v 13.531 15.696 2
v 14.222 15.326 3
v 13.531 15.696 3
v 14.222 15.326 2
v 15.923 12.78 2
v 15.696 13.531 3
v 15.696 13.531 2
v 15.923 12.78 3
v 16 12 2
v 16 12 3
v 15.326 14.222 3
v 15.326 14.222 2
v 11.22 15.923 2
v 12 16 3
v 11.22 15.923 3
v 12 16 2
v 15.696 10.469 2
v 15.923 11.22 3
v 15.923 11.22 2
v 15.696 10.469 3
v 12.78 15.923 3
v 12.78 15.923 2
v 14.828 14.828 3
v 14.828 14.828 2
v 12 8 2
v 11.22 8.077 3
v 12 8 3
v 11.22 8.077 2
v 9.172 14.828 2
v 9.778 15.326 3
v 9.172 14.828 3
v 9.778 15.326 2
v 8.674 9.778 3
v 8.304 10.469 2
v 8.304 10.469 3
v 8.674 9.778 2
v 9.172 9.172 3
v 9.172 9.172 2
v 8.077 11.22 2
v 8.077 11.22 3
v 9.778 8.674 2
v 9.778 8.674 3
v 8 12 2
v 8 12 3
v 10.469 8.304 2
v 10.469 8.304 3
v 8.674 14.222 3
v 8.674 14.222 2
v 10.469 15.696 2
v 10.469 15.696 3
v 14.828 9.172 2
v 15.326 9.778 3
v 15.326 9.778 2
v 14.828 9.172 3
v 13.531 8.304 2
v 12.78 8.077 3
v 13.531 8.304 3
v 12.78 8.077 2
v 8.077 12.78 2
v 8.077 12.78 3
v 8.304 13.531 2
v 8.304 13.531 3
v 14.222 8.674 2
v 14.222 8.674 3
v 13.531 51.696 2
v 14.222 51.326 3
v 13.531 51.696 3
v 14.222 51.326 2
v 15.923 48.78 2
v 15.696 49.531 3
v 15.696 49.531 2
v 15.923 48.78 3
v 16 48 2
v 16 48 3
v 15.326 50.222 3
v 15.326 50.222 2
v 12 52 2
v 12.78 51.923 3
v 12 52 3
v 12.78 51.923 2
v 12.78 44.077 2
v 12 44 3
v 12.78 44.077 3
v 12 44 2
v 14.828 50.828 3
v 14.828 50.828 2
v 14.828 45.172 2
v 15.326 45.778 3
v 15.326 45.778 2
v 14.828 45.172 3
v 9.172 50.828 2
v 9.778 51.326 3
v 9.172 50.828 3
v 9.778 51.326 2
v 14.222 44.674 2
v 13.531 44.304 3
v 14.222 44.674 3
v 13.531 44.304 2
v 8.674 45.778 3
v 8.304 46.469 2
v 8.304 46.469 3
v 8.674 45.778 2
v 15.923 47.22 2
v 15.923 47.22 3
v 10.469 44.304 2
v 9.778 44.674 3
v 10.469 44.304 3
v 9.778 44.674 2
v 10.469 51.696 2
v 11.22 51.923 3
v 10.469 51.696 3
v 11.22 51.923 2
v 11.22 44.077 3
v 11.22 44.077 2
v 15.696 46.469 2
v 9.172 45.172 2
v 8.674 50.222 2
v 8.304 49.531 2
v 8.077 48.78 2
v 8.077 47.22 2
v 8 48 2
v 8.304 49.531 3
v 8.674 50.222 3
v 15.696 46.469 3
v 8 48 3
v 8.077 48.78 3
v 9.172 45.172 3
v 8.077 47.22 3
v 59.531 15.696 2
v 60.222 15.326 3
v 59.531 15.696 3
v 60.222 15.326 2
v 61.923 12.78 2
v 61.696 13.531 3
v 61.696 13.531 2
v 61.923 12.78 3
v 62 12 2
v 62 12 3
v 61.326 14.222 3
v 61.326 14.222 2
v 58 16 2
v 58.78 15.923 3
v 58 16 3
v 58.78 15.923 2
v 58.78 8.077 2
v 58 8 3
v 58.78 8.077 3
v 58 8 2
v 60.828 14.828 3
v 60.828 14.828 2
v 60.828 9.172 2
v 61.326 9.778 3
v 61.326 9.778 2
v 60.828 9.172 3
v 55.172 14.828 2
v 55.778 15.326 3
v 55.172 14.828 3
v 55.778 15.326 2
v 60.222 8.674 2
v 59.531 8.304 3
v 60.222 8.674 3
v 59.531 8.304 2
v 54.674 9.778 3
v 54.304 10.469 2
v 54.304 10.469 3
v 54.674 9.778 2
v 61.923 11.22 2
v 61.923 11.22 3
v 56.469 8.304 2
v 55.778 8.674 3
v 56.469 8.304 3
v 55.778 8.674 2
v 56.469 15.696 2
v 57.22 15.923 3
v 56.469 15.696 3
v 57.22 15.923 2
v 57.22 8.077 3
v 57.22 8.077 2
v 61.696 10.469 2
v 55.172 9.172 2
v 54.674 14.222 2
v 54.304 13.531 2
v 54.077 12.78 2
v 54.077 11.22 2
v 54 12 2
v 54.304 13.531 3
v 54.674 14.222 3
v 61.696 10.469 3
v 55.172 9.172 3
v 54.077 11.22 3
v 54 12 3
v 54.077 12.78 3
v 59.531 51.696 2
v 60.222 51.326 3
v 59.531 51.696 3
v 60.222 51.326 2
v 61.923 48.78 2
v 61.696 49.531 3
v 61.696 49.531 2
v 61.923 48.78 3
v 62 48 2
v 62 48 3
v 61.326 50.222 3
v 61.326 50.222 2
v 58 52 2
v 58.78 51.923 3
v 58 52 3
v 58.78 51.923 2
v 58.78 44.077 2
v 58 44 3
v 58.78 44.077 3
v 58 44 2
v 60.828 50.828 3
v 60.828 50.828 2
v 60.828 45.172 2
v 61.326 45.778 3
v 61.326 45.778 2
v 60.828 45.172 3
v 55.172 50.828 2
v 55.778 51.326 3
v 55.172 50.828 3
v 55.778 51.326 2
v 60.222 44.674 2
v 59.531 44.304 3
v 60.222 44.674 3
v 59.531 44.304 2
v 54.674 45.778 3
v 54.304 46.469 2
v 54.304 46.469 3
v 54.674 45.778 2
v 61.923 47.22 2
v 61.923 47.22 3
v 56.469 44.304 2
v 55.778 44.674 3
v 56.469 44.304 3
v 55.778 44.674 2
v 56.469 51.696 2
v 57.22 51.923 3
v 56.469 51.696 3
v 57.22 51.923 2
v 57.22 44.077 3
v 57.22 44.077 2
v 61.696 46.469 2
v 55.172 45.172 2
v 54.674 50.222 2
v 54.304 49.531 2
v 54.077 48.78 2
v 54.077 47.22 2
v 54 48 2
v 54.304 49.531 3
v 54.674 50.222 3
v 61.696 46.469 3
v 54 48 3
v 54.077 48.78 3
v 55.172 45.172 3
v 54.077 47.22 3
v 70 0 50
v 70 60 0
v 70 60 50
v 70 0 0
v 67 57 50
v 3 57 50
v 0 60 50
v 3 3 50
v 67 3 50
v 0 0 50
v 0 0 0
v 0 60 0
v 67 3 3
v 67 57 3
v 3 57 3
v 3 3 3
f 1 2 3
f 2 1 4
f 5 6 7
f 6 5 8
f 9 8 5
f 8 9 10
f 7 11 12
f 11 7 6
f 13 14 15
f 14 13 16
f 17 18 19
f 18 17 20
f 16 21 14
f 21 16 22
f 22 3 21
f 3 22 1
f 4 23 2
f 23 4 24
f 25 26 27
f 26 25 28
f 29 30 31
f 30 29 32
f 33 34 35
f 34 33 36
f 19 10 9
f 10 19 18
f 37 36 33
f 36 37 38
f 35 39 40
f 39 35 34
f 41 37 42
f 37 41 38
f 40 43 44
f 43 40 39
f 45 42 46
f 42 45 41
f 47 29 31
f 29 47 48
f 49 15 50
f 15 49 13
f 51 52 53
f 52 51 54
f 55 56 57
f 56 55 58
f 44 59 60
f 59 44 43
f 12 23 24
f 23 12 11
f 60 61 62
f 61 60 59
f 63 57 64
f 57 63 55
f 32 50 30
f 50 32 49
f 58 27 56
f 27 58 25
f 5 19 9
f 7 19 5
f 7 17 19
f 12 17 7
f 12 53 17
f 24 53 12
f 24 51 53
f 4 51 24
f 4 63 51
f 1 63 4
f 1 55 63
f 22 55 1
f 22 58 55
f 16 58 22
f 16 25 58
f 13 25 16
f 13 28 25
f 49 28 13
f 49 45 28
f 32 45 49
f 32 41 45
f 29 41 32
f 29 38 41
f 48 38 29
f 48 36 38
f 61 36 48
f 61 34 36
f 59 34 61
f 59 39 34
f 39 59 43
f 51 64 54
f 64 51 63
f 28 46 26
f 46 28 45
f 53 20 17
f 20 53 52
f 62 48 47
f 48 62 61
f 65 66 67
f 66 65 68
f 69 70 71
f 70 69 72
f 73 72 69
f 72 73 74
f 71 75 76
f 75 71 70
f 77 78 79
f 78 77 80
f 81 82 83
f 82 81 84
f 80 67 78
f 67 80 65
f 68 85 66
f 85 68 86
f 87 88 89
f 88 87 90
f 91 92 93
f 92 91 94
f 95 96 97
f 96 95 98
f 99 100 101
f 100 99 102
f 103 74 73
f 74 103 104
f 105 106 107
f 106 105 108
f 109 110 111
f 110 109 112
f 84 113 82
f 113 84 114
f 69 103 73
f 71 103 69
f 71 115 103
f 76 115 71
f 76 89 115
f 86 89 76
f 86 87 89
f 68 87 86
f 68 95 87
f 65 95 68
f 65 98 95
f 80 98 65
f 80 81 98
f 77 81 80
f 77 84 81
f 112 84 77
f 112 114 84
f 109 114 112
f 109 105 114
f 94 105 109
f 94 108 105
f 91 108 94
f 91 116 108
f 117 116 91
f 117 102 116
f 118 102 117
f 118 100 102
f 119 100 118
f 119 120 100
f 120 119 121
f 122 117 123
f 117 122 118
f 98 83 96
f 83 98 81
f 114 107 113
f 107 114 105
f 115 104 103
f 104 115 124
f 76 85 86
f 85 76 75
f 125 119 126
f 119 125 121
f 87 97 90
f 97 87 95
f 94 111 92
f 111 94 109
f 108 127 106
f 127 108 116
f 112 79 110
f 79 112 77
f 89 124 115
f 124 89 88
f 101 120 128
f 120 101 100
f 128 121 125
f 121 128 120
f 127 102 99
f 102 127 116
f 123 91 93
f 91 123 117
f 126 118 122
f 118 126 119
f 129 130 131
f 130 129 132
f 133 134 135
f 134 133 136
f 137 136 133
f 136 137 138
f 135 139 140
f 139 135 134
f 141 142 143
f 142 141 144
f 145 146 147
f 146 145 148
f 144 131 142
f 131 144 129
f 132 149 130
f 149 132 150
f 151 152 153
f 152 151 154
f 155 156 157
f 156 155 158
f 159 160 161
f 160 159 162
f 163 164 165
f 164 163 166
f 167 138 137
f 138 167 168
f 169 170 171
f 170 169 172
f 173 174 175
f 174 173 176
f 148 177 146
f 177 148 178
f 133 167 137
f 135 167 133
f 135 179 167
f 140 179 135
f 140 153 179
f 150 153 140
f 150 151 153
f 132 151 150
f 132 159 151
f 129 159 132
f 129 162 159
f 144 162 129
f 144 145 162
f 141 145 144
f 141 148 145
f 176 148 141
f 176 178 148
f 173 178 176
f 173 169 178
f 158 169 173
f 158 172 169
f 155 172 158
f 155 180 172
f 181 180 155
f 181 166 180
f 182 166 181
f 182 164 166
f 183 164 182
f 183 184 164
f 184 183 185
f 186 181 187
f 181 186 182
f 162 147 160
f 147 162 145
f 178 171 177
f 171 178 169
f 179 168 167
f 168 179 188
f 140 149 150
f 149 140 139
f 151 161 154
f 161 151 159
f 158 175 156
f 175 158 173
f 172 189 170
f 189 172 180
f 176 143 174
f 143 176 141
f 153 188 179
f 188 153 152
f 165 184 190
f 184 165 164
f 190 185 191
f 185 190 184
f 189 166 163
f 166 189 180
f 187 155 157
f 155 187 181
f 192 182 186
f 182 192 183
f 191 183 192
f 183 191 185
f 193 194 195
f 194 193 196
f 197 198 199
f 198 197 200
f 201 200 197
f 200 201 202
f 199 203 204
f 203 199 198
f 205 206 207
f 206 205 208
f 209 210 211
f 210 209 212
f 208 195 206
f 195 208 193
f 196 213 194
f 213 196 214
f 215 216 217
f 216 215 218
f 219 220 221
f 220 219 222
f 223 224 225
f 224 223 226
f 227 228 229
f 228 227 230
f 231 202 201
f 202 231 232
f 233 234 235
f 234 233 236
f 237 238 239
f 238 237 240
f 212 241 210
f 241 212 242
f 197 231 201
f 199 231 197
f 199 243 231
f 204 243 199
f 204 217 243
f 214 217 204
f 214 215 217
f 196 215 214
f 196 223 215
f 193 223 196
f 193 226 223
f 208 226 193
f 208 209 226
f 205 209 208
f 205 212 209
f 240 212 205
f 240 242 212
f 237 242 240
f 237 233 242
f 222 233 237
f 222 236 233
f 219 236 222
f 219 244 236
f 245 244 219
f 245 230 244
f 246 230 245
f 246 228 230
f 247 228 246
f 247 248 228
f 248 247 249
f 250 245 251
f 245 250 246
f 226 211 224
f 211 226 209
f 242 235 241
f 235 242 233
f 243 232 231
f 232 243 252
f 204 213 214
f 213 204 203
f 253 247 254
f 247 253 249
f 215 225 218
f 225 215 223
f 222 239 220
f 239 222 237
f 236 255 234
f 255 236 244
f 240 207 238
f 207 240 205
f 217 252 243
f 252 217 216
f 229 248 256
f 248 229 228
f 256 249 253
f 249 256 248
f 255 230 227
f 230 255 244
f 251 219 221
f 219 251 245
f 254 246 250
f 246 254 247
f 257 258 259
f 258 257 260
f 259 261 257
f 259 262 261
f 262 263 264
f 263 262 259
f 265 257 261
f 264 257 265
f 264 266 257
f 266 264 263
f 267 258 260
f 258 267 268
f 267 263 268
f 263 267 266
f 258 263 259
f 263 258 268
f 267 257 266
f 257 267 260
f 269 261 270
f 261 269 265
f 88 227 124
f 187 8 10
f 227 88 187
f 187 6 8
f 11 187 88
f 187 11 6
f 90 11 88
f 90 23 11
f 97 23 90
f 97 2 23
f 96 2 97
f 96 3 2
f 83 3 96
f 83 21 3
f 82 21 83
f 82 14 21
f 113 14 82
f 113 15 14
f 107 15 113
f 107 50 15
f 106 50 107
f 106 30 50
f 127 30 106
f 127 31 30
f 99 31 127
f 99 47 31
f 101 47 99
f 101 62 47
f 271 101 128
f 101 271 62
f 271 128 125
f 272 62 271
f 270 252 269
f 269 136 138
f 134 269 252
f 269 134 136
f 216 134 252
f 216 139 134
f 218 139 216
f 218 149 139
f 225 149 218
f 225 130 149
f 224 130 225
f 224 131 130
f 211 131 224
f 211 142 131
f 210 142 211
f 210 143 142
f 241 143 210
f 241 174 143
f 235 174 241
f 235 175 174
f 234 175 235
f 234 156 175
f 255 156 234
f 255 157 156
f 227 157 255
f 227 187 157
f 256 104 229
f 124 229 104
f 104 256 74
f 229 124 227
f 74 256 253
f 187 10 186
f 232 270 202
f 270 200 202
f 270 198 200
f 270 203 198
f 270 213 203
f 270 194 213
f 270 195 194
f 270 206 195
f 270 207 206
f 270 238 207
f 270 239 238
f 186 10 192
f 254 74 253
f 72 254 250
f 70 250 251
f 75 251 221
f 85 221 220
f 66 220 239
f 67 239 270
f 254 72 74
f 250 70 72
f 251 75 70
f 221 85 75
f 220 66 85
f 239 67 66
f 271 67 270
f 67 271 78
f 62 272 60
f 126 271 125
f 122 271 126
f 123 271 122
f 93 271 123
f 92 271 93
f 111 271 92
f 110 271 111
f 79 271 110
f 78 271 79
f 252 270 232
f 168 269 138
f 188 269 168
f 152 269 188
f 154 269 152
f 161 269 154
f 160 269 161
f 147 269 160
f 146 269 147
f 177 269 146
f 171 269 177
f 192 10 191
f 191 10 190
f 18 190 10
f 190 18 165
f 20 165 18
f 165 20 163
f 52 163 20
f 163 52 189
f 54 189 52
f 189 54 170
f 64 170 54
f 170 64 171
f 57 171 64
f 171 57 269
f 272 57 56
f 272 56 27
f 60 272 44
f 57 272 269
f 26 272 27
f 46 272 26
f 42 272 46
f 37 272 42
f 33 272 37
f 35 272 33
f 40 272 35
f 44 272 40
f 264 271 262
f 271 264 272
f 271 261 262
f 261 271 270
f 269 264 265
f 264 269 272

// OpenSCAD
$fn = 32;

// ----------------------------------------------------------------------
// Enclosure box: bosses enclosure
// ----------------------------------------------------------------------

// --- parameters (mm) ---
box_l = 70;               // outer length, X
box_w = 60;               // outer width, Y
box_h = 50;               // outer height
wall_t = 3;               // wall thickness
boss_r = 4;               // corner boss radius
hole_r = 2;               // boss screw hole radius
boss_in = 12;             // boss inset from the corners
fit_tol = 0.05;           // tolerance for press fits, mm
free_tol = 0.3;           // tolerance for clearance fits, mm

inner_h = box_h - wall_t;  // cavity depth
boss_h = inner_h - 2;  // corner boss height

difference() {
  cube([box_l, box_w, box_h]);
  translate([wall_t, wall_t, wall_t])
    cube([box_l - 2 * wall_t, box_w - 2 * wall_t, box_h]);
  for (sx = [0, 1], sy = [0, 1])
    translate([sx ? box_l - boss_in : boss_in,
               sy ? box_w - boss_in : boss_in, wall_t - 1]) {
      cylinder(r = boss_r, h = boss_h);
      translate([0, 0, boss_h - 4])
        cylinder(r = hole_r, h = 5);
    }
}
